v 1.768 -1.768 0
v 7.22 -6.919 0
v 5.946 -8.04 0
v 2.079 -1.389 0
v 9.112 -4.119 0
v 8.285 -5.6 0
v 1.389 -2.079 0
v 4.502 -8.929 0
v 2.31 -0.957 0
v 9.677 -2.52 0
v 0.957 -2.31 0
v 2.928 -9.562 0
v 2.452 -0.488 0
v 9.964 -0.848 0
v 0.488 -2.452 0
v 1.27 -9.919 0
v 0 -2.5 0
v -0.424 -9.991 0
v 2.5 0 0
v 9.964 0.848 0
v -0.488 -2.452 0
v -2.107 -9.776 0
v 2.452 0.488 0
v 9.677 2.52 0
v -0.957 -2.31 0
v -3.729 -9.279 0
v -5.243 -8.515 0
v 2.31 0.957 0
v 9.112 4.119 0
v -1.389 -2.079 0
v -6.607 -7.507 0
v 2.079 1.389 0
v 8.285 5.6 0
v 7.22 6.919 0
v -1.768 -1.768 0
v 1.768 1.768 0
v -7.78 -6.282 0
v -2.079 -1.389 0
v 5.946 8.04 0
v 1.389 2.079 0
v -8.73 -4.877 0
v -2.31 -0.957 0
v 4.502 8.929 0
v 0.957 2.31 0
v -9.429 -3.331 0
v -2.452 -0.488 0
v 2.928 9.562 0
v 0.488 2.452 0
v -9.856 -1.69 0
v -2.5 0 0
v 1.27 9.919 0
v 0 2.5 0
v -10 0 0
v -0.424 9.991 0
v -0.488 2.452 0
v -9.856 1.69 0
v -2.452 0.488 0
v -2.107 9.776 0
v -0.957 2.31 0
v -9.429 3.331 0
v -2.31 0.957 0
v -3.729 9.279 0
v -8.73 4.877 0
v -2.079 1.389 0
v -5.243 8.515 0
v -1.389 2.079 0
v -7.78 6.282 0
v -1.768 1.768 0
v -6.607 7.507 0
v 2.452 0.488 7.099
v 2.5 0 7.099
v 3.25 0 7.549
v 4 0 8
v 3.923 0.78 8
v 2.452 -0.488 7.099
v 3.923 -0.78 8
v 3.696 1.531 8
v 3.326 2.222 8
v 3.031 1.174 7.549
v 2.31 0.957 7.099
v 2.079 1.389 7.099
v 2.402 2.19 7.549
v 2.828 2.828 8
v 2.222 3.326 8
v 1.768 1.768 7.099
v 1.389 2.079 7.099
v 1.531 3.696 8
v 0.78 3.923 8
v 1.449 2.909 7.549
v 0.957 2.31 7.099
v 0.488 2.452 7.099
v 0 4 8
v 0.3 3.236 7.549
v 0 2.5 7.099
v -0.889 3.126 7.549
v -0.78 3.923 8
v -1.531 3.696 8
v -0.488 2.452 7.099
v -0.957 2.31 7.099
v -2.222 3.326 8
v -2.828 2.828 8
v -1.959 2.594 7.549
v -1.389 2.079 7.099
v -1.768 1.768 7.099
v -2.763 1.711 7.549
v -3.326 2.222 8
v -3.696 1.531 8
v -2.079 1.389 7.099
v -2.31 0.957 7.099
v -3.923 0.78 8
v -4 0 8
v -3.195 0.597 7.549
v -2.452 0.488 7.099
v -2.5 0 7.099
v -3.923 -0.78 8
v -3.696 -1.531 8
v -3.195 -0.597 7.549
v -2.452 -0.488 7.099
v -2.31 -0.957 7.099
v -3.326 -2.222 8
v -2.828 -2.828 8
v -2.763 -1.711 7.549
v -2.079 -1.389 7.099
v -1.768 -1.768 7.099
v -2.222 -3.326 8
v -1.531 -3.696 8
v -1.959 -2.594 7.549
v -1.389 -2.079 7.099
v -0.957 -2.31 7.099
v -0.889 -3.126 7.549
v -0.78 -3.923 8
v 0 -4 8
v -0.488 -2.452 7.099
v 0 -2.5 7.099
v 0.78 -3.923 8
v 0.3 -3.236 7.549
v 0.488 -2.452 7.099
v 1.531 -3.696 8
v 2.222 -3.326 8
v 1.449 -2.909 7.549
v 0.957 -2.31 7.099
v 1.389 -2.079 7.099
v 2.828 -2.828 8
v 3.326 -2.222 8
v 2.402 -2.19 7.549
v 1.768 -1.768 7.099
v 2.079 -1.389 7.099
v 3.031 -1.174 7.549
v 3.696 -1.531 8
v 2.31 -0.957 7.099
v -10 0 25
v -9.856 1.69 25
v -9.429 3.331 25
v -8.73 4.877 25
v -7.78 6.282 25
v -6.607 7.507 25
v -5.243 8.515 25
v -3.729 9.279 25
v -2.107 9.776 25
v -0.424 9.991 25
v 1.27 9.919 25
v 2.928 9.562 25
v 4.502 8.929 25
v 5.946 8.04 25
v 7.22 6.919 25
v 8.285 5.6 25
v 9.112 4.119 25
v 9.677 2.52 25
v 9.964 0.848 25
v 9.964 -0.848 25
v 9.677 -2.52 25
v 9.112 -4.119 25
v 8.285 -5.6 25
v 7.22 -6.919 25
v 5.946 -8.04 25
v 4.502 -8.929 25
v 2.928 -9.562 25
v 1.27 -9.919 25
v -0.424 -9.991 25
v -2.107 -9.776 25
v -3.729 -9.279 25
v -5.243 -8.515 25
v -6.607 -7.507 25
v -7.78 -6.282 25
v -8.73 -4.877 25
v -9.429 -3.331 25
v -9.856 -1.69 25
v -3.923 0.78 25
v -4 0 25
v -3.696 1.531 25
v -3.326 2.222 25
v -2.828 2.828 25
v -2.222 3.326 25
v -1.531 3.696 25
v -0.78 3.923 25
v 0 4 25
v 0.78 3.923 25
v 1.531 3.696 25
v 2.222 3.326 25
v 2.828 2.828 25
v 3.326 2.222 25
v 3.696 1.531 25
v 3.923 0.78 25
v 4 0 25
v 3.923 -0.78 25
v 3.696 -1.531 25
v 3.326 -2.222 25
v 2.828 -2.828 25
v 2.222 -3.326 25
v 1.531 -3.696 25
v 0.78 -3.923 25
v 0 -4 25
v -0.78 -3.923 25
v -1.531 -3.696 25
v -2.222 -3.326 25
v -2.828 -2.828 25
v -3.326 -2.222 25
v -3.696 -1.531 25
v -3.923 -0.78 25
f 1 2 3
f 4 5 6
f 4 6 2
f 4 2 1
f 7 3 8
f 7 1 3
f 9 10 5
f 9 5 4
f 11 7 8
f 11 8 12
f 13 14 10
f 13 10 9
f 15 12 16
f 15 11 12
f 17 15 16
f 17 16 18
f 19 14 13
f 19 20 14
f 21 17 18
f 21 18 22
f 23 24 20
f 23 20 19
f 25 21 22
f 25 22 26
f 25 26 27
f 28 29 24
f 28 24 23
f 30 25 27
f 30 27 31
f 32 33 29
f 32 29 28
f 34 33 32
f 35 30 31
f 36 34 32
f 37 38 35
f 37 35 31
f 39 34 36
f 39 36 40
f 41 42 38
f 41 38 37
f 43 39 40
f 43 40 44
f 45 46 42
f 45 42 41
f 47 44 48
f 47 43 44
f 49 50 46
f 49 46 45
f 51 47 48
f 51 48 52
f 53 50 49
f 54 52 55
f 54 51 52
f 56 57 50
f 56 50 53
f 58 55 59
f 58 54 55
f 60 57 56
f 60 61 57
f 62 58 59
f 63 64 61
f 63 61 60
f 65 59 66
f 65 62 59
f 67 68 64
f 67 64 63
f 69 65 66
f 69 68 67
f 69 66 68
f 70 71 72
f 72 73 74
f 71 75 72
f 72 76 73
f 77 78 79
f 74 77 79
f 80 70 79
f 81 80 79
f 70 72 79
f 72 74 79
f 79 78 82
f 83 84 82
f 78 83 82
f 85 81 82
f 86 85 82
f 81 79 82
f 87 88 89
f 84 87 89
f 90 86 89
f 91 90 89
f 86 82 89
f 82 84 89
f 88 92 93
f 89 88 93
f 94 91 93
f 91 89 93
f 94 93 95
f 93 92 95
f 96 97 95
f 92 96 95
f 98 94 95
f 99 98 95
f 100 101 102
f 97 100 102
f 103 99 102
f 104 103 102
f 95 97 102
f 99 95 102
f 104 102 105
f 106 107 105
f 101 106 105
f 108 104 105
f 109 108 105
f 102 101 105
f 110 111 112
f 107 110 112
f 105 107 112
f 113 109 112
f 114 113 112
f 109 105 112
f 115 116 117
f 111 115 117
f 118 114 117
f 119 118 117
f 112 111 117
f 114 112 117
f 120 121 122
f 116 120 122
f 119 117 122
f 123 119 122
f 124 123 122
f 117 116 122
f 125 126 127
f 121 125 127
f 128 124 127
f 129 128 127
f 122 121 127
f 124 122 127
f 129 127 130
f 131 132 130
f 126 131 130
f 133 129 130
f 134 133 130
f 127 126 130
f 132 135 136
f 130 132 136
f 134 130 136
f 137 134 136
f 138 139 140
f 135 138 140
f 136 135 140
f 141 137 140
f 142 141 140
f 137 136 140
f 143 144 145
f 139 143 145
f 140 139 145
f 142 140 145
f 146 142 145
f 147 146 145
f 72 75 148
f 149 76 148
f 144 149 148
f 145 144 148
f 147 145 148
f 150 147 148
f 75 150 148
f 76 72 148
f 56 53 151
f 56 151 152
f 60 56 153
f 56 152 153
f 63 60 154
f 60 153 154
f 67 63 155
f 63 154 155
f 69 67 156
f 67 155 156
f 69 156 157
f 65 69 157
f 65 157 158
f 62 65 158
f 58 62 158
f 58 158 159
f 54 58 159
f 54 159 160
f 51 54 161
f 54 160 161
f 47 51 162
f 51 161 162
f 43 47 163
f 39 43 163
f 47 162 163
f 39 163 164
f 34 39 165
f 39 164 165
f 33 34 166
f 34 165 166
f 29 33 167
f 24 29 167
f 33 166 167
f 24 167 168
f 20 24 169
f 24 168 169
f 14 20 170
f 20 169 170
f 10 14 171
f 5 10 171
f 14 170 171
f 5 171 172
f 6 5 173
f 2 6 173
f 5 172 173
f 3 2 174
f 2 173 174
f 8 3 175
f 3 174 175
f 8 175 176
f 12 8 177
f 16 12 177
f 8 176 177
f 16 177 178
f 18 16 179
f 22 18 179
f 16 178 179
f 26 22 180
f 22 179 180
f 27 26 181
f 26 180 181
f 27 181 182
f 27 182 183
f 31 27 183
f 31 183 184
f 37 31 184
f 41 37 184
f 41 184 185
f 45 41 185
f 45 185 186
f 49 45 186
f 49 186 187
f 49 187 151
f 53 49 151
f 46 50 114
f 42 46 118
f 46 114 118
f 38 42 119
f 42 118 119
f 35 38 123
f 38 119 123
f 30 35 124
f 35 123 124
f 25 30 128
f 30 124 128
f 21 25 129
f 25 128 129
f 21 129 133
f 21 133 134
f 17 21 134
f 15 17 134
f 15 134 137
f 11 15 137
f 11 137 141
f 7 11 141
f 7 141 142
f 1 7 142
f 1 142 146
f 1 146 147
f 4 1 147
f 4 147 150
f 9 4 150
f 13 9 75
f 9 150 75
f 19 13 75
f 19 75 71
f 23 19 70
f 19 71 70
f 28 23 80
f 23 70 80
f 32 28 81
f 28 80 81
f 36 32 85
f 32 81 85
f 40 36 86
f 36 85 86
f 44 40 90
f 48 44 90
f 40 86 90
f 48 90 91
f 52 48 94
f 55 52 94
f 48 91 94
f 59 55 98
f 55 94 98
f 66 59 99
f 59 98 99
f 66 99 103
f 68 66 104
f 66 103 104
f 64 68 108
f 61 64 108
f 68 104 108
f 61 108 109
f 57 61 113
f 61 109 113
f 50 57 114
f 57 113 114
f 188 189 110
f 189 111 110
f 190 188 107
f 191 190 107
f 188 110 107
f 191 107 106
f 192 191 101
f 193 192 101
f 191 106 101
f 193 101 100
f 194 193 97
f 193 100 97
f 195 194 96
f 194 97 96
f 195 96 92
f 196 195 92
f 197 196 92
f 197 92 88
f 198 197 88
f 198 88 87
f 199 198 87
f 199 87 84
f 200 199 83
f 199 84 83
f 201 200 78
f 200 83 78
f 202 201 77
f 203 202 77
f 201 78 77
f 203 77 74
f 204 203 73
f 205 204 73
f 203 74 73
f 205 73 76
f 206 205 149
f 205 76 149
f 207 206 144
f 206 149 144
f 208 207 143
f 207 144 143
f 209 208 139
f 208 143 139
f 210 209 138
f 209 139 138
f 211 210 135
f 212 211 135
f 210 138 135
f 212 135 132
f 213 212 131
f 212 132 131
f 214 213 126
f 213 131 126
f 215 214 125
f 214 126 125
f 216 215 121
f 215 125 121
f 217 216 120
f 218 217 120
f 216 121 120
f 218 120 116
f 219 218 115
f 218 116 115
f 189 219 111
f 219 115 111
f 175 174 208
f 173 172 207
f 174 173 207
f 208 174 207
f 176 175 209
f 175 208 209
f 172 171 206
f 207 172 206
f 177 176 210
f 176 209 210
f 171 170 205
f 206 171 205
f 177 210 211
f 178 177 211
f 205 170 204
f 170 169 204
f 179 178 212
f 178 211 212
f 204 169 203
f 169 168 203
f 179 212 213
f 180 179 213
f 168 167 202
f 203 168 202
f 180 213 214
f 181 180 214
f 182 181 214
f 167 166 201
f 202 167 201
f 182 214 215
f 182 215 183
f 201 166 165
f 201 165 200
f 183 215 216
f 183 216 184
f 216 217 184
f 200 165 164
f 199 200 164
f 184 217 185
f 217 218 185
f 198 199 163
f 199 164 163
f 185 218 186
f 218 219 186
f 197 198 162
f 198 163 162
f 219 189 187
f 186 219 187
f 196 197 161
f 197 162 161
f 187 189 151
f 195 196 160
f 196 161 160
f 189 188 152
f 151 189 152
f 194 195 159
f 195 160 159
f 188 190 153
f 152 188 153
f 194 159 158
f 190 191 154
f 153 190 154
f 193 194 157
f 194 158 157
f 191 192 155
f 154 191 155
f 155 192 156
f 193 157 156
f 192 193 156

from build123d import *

# Parameters (mm, degrees)
F0_W     = 10
F0_H     = 25
F3_D     = 8
F3_DEPTH = 17
F3_TIP   = 2.4034424761
F5_D     = 5


with BuildPart() as f1:
    # F0 (on Front) → F1 (revolve)
    with BuildSketch(Plane.XZ):
        with Locations((-5, 12.5)):
            Rectangle(F0_W, F0_H)
    revolve(axis=Axis((0, 0, 12.5), (0, 0, -1)))

    # F3
    with Locations(Plane.XY.offset(25)):
        with Locations((0, 0)):
            Hole(F3_D / 2, depth=F3_DEPTH)
            with Locations((0, 0, -(F3_DEPTH + F3_TIP / 2))):  # 118° drill point
                Cone(0, F3_D / 2, F3_TIP, mode=Mode.SUBTRACT)

    # F5 (through all)
    with Locations(Plane(origin=(0, 0, 0), x_dir=(1, 0, 0), z_dir=(0, 0, -1))):
        with Locations((0, 0)):
            Hole(F5_D / 2)


solid = f1.part
